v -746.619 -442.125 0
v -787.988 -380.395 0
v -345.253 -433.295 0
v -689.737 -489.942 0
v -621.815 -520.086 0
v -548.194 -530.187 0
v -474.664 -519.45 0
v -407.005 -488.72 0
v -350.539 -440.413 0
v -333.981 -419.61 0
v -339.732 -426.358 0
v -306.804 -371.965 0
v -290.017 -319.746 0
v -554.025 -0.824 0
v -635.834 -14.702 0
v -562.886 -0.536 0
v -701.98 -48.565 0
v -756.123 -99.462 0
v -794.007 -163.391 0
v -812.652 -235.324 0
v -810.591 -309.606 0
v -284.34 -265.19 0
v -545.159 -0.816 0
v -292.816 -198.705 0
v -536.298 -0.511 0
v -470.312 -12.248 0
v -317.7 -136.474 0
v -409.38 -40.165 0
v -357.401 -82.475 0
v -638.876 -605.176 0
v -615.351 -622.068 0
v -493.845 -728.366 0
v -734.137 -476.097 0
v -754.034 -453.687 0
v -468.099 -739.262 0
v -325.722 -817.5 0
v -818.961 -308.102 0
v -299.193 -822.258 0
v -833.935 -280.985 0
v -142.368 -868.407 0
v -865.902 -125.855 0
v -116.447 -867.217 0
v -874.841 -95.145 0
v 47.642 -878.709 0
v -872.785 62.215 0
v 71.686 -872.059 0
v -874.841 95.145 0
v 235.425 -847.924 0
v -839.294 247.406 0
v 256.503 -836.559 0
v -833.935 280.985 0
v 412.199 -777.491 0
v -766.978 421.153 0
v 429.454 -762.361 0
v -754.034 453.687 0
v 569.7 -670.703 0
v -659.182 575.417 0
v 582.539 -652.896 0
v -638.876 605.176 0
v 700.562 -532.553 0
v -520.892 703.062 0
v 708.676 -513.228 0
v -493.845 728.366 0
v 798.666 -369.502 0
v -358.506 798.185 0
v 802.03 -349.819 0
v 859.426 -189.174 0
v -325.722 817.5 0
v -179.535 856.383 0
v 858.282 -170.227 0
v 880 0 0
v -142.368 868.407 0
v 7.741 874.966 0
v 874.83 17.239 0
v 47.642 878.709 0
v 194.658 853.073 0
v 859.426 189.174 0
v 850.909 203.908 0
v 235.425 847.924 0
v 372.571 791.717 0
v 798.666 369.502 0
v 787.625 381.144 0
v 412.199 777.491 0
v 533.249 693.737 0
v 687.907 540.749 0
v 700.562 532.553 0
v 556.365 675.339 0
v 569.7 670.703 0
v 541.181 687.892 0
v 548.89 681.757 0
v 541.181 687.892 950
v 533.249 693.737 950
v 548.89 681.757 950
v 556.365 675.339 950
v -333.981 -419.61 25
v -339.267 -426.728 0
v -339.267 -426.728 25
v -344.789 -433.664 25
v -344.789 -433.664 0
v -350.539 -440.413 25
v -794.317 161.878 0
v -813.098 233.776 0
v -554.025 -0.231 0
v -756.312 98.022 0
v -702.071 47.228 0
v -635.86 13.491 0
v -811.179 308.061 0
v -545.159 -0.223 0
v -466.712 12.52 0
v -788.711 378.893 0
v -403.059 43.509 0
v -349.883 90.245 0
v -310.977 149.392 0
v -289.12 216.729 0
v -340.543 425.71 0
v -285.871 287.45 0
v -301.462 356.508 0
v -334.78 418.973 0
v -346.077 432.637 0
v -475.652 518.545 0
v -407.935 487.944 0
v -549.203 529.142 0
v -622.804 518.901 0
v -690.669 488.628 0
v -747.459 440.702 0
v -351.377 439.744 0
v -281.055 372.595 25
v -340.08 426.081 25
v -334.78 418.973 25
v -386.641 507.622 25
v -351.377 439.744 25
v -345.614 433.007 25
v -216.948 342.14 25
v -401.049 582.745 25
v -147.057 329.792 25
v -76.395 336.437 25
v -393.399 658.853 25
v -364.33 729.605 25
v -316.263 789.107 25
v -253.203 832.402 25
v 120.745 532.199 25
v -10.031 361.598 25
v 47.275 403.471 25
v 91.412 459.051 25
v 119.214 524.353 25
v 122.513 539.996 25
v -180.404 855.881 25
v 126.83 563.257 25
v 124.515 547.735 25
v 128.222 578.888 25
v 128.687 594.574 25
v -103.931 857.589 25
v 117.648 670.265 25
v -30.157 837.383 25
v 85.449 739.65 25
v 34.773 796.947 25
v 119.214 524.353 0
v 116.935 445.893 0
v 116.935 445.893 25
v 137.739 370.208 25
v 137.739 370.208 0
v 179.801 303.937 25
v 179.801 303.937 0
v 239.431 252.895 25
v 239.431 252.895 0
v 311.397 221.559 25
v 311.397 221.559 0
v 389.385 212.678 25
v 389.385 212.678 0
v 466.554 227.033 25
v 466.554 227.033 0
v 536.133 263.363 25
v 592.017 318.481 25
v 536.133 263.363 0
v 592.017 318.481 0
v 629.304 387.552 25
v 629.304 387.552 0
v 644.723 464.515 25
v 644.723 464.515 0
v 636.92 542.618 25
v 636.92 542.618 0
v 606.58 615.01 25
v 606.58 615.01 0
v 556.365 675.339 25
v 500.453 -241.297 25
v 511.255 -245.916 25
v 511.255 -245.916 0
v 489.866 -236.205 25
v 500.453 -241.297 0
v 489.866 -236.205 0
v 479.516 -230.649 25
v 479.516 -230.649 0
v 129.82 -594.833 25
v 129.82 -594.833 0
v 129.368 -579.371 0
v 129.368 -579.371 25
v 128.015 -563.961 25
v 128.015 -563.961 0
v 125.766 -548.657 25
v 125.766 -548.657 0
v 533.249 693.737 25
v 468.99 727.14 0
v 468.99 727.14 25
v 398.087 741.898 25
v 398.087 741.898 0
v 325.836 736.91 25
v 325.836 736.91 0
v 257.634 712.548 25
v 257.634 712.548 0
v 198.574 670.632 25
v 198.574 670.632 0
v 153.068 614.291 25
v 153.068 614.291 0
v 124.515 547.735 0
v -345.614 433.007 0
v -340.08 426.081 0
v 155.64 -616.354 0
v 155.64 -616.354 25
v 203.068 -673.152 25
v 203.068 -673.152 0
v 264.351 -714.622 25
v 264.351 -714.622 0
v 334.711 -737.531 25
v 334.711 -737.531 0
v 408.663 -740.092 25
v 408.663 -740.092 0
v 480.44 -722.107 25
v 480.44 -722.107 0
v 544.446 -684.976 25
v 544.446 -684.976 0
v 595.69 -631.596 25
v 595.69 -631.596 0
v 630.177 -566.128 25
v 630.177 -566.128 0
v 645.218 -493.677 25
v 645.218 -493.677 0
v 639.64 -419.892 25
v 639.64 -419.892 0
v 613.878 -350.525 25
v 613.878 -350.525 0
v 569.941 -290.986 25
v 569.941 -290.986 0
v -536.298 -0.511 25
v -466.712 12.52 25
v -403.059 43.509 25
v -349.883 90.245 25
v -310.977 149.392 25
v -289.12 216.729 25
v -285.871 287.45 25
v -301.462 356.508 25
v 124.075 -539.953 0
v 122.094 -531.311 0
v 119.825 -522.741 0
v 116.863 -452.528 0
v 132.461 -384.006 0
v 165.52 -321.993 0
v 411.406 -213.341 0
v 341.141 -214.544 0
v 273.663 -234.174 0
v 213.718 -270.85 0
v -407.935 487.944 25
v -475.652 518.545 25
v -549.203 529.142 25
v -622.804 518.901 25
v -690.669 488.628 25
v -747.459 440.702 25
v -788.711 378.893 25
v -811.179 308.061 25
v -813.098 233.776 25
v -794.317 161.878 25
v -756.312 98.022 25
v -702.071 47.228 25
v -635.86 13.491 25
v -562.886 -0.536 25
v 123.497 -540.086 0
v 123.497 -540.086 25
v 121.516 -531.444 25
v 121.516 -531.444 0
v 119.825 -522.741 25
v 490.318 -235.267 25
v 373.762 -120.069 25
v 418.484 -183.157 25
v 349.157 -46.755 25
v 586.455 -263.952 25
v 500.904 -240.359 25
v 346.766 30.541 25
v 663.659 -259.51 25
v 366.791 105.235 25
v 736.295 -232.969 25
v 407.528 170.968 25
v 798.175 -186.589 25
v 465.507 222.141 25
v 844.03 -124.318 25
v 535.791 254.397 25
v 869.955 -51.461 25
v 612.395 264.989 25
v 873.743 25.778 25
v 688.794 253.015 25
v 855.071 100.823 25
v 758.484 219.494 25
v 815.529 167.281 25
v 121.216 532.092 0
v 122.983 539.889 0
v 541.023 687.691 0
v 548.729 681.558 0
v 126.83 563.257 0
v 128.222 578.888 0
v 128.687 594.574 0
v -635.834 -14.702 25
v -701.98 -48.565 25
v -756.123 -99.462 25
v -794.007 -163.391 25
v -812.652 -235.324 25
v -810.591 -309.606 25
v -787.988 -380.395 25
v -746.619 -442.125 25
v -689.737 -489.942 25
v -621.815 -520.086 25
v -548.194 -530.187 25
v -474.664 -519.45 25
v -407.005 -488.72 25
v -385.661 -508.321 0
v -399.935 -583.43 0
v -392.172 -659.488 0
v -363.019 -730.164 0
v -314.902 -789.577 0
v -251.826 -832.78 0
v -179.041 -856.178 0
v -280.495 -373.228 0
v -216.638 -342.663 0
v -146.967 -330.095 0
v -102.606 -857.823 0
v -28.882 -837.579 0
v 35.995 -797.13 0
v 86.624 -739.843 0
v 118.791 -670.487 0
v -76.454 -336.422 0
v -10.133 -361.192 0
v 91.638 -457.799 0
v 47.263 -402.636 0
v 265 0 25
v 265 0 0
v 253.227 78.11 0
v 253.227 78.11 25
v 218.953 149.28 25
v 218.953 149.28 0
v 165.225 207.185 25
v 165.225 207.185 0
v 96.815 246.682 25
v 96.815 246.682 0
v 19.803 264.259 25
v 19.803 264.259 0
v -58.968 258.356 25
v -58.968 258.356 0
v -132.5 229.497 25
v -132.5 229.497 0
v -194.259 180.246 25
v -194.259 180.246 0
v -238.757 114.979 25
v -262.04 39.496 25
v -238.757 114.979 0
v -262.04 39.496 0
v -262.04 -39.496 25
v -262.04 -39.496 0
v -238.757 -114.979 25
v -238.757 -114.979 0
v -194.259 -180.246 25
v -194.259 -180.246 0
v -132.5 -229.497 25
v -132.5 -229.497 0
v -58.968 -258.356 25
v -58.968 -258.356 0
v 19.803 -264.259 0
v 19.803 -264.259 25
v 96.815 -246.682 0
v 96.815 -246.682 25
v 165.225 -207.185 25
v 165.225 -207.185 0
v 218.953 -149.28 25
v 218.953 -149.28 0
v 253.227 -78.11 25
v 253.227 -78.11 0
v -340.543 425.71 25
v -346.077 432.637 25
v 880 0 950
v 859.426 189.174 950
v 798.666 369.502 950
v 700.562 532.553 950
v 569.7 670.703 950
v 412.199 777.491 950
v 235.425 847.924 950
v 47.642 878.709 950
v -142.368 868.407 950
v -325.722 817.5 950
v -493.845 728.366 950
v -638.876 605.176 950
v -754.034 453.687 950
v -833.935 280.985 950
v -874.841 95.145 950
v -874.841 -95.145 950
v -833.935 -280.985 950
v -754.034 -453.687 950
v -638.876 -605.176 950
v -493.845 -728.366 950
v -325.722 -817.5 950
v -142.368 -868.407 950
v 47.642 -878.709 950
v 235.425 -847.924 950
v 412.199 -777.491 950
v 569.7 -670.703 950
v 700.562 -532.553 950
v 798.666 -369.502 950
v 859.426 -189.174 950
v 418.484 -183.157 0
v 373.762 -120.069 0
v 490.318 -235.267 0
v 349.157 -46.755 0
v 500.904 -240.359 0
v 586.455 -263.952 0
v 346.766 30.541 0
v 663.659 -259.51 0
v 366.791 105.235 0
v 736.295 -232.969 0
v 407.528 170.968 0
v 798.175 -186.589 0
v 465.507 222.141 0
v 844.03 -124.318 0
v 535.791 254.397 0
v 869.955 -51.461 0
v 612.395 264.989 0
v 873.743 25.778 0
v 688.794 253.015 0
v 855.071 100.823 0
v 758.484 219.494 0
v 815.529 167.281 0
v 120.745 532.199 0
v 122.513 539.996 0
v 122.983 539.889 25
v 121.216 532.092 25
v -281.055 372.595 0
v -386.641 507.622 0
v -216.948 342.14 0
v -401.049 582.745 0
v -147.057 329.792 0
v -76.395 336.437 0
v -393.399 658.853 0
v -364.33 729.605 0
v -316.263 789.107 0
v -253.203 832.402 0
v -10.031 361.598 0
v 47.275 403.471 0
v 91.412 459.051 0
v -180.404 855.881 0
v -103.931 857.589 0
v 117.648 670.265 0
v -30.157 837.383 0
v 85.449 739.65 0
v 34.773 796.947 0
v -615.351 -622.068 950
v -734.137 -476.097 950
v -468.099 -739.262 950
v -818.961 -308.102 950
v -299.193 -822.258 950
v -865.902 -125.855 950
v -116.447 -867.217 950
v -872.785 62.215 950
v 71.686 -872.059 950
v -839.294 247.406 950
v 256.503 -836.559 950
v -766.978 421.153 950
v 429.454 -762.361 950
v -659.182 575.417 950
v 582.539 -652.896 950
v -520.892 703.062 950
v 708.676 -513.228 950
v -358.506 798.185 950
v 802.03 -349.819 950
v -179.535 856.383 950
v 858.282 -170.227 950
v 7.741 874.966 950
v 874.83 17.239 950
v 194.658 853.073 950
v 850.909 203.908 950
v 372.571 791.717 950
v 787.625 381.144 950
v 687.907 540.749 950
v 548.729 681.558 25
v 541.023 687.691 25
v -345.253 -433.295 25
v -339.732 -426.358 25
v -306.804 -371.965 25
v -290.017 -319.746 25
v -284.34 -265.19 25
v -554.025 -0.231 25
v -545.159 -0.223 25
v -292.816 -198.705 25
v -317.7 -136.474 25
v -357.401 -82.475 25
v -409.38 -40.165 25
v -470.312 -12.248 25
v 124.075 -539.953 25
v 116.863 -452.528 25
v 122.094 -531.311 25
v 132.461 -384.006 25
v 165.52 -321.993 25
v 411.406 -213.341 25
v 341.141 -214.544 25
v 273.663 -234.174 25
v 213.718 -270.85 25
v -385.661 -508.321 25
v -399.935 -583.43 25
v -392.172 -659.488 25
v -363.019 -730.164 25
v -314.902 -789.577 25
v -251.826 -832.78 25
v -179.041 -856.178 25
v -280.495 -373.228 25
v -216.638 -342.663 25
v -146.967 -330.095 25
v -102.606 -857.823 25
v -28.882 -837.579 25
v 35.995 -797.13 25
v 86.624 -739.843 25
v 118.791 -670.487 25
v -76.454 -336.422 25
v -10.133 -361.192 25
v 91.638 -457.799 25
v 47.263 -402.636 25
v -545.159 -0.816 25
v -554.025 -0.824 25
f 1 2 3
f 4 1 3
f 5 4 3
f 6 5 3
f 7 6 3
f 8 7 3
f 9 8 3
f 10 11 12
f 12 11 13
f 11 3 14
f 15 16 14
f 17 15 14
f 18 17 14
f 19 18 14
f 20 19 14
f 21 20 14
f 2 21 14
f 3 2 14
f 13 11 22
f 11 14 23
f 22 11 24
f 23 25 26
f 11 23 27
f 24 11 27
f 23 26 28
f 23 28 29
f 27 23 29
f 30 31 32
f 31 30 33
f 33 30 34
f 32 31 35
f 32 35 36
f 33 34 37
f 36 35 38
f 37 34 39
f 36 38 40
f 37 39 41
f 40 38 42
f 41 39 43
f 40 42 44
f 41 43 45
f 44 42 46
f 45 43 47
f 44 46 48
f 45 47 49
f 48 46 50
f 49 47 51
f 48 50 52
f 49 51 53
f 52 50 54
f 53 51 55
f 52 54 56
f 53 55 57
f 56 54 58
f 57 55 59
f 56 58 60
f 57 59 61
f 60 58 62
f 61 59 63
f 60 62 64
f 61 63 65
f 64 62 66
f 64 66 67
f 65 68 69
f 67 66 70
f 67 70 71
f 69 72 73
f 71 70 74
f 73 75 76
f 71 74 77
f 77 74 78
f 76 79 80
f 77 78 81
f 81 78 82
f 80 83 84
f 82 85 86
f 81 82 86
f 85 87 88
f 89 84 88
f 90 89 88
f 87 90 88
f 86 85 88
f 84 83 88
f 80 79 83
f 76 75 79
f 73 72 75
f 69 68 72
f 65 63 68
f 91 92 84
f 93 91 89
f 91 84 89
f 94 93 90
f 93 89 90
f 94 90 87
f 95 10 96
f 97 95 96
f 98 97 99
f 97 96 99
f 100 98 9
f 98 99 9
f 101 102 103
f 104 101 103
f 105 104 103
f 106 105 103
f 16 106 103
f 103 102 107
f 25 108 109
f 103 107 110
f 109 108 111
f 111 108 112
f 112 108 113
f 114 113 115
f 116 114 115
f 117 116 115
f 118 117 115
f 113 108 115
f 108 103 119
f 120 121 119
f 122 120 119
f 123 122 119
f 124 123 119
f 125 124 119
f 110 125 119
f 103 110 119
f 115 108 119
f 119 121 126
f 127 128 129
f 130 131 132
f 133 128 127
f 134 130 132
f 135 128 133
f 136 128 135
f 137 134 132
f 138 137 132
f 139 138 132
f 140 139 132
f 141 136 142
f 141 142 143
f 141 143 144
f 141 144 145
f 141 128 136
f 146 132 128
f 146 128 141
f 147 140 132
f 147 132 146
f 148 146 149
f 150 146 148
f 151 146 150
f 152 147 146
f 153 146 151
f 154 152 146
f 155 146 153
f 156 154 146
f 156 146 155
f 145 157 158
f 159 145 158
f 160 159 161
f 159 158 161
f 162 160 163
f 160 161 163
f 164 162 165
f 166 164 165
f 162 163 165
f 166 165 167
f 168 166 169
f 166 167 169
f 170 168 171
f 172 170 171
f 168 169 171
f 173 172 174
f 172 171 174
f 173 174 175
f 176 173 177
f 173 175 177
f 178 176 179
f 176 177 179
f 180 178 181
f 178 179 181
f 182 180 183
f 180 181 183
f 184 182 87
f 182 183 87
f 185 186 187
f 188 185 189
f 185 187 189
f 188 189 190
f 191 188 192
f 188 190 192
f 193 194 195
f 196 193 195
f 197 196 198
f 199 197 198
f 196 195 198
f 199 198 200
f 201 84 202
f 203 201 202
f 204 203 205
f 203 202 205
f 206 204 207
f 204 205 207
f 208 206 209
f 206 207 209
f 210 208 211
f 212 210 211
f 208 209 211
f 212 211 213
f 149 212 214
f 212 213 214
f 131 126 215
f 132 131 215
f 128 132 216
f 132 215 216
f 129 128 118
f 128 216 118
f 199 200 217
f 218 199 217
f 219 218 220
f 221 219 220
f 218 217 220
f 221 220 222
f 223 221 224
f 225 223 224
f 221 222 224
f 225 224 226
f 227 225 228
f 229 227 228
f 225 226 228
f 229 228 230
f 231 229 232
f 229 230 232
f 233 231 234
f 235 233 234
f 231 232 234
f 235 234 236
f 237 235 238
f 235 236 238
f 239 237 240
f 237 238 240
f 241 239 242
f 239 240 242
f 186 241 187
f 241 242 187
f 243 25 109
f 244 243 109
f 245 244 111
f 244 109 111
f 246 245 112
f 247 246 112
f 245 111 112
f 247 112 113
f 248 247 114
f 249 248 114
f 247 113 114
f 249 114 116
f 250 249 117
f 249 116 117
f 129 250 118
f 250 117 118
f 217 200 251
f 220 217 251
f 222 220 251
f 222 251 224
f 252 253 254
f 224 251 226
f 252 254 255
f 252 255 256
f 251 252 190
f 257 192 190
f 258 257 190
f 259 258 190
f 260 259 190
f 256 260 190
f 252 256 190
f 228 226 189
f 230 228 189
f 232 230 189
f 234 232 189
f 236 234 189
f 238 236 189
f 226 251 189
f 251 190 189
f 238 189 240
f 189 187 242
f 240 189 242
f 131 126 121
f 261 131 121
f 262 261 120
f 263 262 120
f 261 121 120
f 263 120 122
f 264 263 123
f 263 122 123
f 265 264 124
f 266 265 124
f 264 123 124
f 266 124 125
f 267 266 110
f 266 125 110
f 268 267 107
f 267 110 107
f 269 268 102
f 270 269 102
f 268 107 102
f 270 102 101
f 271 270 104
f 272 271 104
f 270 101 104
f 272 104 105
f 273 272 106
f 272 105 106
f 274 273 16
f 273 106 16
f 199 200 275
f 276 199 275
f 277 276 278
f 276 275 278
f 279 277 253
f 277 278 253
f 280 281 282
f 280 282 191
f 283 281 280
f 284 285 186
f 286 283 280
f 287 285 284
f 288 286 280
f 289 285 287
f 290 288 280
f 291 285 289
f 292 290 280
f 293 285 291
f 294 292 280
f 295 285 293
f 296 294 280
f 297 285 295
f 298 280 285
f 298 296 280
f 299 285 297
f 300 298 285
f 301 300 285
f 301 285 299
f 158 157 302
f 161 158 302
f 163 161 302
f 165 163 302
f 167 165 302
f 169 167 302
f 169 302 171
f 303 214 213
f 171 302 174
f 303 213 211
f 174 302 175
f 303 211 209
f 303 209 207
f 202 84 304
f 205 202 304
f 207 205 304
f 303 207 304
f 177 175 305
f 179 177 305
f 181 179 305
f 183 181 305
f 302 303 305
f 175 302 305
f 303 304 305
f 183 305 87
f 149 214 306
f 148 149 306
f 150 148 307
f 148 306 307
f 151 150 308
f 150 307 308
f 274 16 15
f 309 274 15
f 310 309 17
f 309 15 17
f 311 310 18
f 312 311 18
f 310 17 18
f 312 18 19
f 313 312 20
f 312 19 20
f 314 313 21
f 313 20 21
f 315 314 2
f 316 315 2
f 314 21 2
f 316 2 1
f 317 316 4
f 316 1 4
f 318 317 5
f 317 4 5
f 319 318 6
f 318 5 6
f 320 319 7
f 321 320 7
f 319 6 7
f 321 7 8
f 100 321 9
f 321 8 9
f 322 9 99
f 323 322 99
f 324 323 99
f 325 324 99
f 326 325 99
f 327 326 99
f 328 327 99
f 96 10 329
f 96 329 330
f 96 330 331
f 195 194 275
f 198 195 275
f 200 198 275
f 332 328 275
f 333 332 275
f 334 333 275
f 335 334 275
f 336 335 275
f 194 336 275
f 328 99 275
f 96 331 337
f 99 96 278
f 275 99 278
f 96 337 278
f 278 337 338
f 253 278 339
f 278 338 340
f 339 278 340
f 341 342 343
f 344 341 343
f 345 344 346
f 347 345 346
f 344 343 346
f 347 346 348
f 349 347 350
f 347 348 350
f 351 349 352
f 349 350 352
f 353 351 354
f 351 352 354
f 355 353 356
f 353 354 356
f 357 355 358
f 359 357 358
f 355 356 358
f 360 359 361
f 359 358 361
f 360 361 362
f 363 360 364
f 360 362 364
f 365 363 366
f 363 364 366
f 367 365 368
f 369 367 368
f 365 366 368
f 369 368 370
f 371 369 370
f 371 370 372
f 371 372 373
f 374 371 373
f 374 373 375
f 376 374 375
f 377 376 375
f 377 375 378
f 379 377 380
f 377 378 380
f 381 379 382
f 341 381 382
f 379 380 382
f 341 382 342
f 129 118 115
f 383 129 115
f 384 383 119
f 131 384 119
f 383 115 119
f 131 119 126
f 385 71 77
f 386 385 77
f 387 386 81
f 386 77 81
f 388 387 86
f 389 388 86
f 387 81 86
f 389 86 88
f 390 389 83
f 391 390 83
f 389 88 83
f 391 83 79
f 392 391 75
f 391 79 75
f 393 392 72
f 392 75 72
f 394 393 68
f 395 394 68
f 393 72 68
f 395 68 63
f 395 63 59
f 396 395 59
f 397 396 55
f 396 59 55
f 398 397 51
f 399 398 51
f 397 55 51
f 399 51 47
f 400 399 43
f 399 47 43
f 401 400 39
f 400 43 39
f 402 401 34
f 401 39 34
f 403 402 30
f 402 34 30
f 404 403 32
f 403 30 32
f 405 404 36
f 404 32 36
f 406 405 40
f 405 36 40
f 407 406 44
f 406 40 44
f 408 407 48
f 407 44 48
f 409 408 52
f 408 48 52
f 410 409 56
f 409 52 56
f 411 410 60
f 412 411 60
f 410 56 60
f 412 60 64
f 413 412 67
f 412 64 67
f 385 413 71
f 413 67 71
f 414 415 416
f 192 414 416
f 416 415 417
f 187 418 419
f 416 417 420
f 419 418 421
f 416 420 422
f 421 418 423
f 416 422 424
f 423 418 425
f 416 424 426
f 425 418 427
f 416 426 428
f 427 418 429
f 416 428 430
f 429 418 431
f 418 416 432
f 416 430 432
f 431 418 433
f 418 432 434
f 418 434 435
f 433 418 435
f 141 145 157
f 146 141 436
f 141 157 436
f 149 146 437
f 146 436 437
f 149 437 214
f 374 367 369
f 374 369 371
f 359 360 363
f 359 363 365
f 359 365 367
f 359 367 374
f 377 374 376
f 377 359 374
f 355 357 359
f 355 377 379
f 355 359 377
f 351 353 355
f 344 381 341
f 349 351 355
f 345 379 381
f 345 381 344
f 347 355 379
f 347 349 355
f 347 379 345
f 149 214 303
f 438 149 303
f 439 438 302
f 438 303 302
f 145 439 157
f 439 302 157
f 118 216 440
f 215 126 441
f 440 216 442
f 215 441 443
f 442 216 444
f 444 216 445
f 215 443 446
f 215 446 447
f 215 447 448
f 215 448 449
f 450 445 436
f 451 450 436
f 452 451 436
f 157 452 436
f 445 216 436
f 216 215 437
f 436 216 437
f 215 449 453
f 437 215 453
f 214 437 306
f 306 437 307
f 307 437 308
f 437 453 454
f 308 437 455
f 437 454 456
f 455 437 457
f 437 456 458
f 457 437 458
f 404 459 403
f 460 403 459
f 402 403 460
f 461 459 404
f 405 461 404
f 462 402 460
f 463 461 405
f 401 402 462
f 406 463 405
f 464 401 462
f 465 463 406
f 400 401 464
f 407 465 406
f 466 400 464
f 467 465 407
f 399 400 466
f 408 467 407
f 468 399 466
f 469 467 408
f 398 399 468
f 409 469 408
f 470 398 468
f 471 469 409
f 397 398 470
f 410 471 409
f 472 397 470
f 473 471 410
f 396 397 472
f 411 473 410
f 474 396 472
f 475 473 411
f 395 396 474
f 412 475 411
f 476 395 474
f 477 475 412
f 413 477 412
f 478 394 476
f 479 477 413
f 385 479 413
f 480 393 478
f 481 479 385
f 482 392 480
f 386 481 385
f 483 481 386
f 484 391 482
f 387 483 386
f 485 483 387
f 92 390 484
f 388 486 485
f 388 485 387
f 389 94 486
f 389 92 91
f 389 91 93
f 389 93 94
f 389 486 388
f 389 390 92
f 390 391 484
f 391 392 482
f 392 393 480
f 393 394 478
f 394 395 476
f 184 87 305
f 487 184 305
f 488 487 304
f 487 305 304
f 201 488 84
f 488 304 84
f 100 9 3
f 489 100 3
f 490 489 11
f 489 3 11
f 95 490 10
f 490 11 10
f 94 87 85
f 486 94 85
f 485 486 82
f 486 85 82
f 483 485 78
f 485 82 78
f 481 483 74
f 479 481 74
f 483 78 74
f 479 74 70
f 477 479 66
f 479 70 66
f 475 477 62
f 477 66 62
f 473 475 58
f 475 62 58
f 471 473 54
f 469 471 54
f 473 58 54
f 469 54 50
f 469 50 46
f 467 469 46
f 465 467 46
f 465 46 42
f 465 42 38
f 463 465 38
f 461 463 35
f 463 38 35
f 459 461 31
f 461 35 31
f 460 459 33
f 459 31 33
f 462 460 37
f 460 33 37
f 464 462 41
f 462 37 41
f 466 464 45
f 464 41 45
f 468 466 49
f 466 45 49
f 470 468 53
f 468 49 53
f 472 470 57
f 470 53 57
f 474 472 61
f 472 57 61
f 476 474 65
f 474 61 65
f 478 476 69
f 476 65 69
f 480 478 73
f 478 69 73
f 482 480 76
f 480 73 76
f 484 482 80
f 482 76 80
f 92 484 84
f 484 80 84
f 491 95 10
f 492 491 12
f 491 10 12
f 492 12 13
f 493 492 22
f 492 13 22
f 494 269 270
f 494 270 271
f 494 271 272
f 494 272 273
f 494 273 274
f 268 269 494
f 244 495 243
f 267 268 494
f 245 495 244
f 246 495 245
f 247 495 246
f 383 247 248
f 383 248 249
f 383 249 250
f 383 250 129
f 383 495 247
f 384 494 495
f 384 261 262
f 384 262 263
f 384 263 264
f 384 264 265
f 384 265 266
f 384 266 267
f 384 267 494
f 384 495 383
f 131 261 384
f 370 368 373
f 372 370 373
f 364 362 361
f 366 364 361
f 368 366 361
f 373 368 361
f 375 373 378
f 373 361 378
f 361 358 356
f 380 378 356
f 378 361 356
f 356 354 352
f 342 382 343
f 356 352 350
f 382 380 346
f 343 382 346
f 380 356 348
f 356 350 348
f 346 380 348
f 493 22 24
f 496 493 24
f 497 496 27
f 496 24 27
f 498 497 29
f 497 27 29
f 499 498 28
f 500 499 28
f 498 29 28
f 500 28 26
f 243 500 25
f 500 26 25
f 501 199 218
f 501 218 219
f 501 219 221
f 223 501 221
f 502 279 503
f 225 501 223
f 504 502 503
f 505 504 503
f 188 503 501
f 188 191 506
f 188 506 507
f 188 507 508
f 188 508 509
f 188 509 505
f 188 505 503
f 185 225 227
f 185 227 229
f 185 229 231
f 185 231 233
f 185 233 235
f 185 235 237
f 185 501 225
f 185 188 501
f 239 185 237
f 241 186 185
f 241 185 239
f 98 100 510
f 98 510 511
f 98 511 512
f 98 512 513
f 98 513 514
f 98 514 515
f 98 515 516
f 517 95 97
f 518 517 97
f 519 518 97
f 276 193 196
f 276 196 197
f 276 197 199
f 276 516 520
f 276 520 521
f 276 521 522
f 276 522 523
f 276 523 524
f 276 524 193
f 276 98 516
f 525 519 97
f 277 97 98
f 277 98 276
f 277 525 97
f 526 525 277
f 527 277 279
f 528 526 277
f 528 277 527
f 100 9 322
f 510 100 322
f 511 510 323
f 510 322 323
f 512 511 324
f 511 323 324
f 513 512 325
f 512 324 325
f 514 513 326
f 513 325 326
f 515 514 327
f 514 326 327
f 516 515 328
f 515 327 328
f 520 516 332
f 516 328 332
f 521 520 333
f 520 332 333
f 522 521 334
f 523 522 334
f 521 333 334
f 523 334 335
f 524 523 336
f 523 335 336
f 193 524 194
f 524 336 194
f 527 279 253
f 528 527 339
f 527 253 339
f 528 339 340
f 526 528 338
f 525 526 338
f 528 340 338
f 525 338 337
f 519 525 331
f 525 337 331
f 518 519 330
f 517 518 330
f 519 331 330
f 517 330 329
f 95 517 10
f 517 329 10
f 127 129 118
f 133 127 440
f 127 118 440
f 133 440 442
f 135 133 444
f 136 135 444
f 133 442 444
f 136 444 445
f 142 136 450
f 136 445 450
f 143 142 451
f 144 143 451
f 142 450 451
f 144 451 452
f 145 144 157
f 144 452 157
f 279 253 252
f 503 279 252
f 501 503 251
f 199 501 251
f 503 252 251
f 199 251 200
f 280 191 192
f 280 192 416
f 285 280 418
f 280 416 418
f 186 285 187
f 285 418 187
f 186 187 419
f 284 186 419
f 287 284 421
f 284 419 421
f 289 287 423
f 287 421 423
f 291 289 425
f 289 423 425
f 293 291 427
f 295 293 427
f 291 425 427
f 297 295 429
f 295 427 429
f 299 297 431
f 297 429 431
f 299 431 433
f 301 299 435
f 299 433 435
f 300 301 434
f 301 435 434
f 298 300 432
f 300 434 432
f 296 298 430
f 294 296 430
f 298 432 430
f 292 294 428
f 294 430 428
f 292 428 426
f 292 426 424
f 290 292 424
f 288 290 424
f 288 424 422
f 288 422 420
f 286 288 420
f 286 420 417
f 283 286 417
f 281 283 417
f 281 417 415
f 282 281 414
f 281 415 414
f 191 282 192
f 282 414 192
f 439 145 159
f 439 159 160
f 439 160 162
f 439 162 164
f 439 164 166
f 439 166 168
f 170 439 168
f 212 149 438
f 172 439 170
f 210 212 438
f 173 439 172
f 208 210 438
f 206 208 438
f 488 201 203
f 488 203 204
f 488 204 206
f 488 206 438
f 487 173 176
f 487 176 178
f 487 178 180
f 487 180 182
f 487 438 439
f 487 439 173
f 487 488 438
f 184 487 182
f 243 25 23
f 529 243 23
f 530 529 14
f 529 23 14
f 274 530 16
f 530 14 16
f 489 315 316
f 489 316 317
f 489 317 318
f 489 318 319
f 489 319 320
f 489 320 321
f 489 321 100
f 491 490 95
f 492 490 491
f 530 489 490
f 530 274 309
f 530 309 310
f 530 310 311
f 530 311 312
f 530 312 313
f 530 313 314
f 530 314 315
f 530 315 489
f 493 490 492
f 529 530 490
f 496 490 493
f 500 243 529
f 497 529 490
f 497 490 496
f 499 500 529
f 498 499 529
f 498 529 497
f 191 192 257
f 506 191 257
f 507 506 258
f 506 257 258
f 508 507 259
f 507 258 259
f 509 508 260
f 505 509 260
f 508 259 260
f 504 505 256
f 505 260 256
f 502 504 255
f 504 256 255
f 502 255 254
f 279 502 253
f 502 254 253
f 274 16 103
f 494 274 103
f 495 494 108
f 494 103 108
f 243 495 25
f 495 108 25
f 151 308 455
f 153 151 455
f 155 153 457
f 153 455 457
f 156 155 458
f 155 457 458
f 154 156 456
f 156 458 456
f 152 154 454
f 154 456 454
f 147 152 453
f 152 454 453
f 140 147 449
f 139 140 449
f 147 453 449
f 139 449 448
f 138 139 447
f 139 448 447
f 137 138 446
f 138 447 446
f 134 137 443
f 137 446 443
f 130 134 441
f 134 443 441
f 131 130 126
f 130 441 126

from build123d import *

# Parameters (mm, degrees)
F1_DEPTH = 25
F0_R     = 265
F0_R_2   = 880
F2_DEPTH = 950


with BuildPart() as f1:
    # F0 (on Top) → F1 (new body)
    with BuildSketch(Plane.XY):
        with BuildLine():
            ThreePointArc((-193.9061843773, -853.2440399207), (30.141564439, -801.9408802065), (129.8196926395, -594.8329887472))
            ThreePointArc((129.8196926395, -594.8329887472), (128.8042074457, -571.6559323656), (125.7655345828, -548.6565058525))
            ThreePointArc((125.7655345828, -548.6565058525), (122.470052193, -535.7732038744), (119.8250195137, -522.7408028614))
            ThreePointArc((119.8250195137, -522.7408028614), (-76.4544361301, -336.4219362587), (-333.9813542907, -419.6098631631))
            ThreePointArc((-333.9813542907, -419.6098631631), (-341.9991199047, -430.2190624071), (-350.5390087439, -440.4126865248))
            ThreePointArc((-350.5390087439, -440.4126865248), (-382.9463676187, -688.8381980929), (-193.9061843773, -853.2440399207))
        make_face()
    extrude(amount=F1_DEPTH)


with BuildPart() as f1b:
    # F0 (on Top) → F1, piece 2 (new body)
    with BuildSketch(Plane.XY):
        with BuildLine():
            ThreePointArc((119.8250195137, -522.7408028614), (123.1205019034, -535.6241048395), (125.7655345828, -548.6565058525))
            ThreePointArc((125.7655345828, -548.6565058525), (299.7849702857, -728.8861094166), (546.1877145957, -683.5963578199))
            ThreePointArc((546.1877145957, -683.5963578199), (619.5808969263, -591.4327967526), (645.7708614569, -476.5643199667))
            ThreePointArc((645.7708614569, -476.5643199667), (609.6849391517, -343.0602187819), (511.2550498858, -245.9155034294))
            ThreePointArc((511.2550498858, -245.9155034294), (495.1315212016, -238.8100345014), (479.5158115711, -230.6488165373))
            ThreePointArc((479.5158115711, -230.6488165373), (213.7178326121, -270.8502330554), (119.8250195137, -522.7408028614))
        make_face()
    extrude(amount=F1_DEPTH)


with BuildPart() as f1c:
    # F0 (on Top) → F1, piece 3 (new body)
    with BuildSketch(Plane.XY):
        with BuildLine():
            ThreePointArc((-787.9877787267, -380.3948745413), (-585.3605198344, -527.7300838352), (-350.5390087439, -440.4126865248))
            ThreePointArc((-350.5390087439, -440.4126865248), (-342.52124313, -429.8034872808), (-333.9813542907, -419.6098631631))
            ThreePointArc((-333.9813542907, -419.6098631631), (-297.0554387565, -346.2911766256), (-284.3400556741, -265.1895609407))
            ThreePointArc((-284.3400556741, -265.1895609407), (-357.4011316606, -82.4754414848), (-536.2981647198, -0.5106817676))
            ThreePointArc((-536.2981647198, -0.5106817676), (-549.5917623332, -0.8570003073), (-562.8859953912, -0.5359996249))
            ThreePointArc((-562.8859953912, -0.5359996249), (-777.3172521182, -130.0918263132), (-787.9877787267, -380.3948745413))
        make_face()
    extrude(amount=F1_DEPTH)


with BuildPart() as f1d:
    # F0 (on Top) → F1, piece 4 (new body)
    with BuildSketch(Plane.XY):
        with BuildLine():
            ThreePointArc((495.0207504098, 238.7567217141), (345.1444456193, 8.7484463585), (479.5158115711, -230.6488165373))
            ThreePointArc((479.5158115711, -230.6488165373), (495.6393402554, -237.7542854654), (511.2550498858, -245.9155034294))
            ThreePointArc((511.2550498858, -245.9155034294), (758.421002927, -219.5363429825), (875, 0))
            ThreePointArc((875, 0), (750.9884726823, 224.3819301341), (495.0207504098, 238.7567217141))
        make_face()
    extrude(amount=F1_DEPTH)


with BuildPart() as f1e:
    # F0 (on Top) → F1, piece 5 (new body)
    with BuildSketch(Plane.XY):
        with BuildLine():
            ThreePointArc((-788.7107999512, 378.8934864053), (-777.5635978963, 128.6112142499), (-562.8859953912, -0.5359996249))
            ThreePointArc((-562.8859953912, -0.5359996249), (-549.5923977778, -0.1896810852), (-536.2981647198, -0.5106817676))
            ThreePointArc((-536.2981647198, -0.5106817676), (-357.7312807823, 81.6116137676), (-284.8441044368, 264.1428795483))
            ThreePointArc((-284.8441044368, 264.1428795483), (-297.6368296433, 345.4846925427), (-334.7798821065, 418.9730454509))
            ThreePointArc((-334.7798821065, 418.9730454509), (-343.339168888, 429.1503871388), (-351.3771248405, 439.7442975662))
            ThreePointArc((-351.3771248405, 439.7442975662), (-586.3645037542, 526.6143264405), (-788.7107999512, 378.8934864053))
        make_face()
    extrude(amount=F1_DEPTH)


with BuildPart() as f1f:
    # F0 (on Top) → F1, piece 6 (new body)
    with BuildSketch(Plane.XY):
        with BuildLine():
            ThreePointArc((119.2137956135, 524.3526253699), (219.7006191662, 266.525760103), (495.0207504098, 238.7567217141))
            ThreePointArc((495.0207504098, 238.7567217141), (604.4234298179, 336.5249707271), (645.0414992079, 477.5134426521))
            ThreePointArc((645.0414992079, 477.5134426521), (621.8583685619, 585.9090223399), (556.365259994, 675.3389500627))
            ThreePointArc((556.365259994, 675.3389500627), (544.884833308, 684.6353178379), (533.2491005483, 693.7365470872))
            ThreePointArc((533.2491005483, 693.7365470872), (290.8989625906, 727.0702661722), (124.5148010842, 547.7352807511))
            ThreePointArc((124.5148010842, 547.7352807511), (122.1288785288, 535.9839709516), (119.2137956135, 524.3526253699))
        make_face()
    extrude(amount=F1_DEPTH)


with BuildPart() as f1g:
    # F0 (on Top) → F1, piece 7 (new body)
    with BuildSketch(Plane.XY):
        with BuildLine():
            ThreePointArc((-195.5307848239, 852.8732099123), (-384.2575390444, 688.1076512362), (-351.3771248405, 439.7442975662))
            ThreePointArc((-351.3771248405, 439.7442975662), (-342.817838059, 429.5669558783), (-334.7798821065, 418.9730454509))
            ThreePointArc((-334.7798821065, 418.9730454509), (-76.3949015791, 336.4372263944), (119.2137956135, 524.3526253699))
            ThreePointArc((119.2137956135, 524.3526253699), (121.599718169, 536.1039351694), (124.5148010842, 547.7352807511))
            ThreePointArc((124.5148010842, 547.7352807511), (127.6419624313, 571.062141726), (128.6870974898, 594.5744634688))
            ThreePointArc((128.6870974898, 594.5744634688), (28.8116886125, 801.8396786077), (-195.5307848239, 852.8732099123))
        make_face()
    extrude(amount=F1_DEPTH)


with BuildPart() as f1h:
    # F0 (on Top) → F1, piece 8 (new body)
    with BuildSketch(Plane.XY):
        Circle(F0_R)
    extrude(amount=F1_DEPTH)


with BuildPart() as f2:
    # F0 (on Top) → F2 (new body)
    with BuildSketch(Plane.XY):
        Circle(F0_R_2)
        with BuildLine():
            ThreePointArc((546.1877145957, -683.5963578199), (195.5010310556, -852.8800307524), (-193.9061843773, -853.2440399207))
            ThreePointArc((-193.9061843773, -853.2440399207), (-544.9087281325, -684.6162998388), (-787.9877787267, -380.3948745413))
            ThreePointArc((-787.9877787267, -380.3948745413), (-874.9996032962, -0.8332055607), (-788.7107999512, 378.8934864053))
            ThreePointArc((-788.7107999512, 378.8934864053), (-546.211560546, 683.5773044257), (-195.5307848239, 852.8732099123))
            ThreePointArc((-195.5307848239, 852.8732099123), (186.6669080413, 854.8569853738), (533.2491005483, 693.7365470872))
            ThreePointArc((533.2491005483, 693.7365470872), (545.0637630098, 684.8601389116), (556.365259994, 675.3389500627))
            ThreePointArc((556.365259994, 675.3389500627), (791.3420886364, 373.3667081471), (875, 0))
            ThreePointArc((875, 0), (788.5236997932, -379.2827110011), (546.1877145957, -683.5963578199))
        make_face(mode=Mode.SUBTRACT)
    extrude(amount=F2_DEPTH)


solid = Compound([f1.part, f1b.part, f1c.part, f1d.part, f1e.part, f1f.part, f1g.part, f1h.part, f2.part])
